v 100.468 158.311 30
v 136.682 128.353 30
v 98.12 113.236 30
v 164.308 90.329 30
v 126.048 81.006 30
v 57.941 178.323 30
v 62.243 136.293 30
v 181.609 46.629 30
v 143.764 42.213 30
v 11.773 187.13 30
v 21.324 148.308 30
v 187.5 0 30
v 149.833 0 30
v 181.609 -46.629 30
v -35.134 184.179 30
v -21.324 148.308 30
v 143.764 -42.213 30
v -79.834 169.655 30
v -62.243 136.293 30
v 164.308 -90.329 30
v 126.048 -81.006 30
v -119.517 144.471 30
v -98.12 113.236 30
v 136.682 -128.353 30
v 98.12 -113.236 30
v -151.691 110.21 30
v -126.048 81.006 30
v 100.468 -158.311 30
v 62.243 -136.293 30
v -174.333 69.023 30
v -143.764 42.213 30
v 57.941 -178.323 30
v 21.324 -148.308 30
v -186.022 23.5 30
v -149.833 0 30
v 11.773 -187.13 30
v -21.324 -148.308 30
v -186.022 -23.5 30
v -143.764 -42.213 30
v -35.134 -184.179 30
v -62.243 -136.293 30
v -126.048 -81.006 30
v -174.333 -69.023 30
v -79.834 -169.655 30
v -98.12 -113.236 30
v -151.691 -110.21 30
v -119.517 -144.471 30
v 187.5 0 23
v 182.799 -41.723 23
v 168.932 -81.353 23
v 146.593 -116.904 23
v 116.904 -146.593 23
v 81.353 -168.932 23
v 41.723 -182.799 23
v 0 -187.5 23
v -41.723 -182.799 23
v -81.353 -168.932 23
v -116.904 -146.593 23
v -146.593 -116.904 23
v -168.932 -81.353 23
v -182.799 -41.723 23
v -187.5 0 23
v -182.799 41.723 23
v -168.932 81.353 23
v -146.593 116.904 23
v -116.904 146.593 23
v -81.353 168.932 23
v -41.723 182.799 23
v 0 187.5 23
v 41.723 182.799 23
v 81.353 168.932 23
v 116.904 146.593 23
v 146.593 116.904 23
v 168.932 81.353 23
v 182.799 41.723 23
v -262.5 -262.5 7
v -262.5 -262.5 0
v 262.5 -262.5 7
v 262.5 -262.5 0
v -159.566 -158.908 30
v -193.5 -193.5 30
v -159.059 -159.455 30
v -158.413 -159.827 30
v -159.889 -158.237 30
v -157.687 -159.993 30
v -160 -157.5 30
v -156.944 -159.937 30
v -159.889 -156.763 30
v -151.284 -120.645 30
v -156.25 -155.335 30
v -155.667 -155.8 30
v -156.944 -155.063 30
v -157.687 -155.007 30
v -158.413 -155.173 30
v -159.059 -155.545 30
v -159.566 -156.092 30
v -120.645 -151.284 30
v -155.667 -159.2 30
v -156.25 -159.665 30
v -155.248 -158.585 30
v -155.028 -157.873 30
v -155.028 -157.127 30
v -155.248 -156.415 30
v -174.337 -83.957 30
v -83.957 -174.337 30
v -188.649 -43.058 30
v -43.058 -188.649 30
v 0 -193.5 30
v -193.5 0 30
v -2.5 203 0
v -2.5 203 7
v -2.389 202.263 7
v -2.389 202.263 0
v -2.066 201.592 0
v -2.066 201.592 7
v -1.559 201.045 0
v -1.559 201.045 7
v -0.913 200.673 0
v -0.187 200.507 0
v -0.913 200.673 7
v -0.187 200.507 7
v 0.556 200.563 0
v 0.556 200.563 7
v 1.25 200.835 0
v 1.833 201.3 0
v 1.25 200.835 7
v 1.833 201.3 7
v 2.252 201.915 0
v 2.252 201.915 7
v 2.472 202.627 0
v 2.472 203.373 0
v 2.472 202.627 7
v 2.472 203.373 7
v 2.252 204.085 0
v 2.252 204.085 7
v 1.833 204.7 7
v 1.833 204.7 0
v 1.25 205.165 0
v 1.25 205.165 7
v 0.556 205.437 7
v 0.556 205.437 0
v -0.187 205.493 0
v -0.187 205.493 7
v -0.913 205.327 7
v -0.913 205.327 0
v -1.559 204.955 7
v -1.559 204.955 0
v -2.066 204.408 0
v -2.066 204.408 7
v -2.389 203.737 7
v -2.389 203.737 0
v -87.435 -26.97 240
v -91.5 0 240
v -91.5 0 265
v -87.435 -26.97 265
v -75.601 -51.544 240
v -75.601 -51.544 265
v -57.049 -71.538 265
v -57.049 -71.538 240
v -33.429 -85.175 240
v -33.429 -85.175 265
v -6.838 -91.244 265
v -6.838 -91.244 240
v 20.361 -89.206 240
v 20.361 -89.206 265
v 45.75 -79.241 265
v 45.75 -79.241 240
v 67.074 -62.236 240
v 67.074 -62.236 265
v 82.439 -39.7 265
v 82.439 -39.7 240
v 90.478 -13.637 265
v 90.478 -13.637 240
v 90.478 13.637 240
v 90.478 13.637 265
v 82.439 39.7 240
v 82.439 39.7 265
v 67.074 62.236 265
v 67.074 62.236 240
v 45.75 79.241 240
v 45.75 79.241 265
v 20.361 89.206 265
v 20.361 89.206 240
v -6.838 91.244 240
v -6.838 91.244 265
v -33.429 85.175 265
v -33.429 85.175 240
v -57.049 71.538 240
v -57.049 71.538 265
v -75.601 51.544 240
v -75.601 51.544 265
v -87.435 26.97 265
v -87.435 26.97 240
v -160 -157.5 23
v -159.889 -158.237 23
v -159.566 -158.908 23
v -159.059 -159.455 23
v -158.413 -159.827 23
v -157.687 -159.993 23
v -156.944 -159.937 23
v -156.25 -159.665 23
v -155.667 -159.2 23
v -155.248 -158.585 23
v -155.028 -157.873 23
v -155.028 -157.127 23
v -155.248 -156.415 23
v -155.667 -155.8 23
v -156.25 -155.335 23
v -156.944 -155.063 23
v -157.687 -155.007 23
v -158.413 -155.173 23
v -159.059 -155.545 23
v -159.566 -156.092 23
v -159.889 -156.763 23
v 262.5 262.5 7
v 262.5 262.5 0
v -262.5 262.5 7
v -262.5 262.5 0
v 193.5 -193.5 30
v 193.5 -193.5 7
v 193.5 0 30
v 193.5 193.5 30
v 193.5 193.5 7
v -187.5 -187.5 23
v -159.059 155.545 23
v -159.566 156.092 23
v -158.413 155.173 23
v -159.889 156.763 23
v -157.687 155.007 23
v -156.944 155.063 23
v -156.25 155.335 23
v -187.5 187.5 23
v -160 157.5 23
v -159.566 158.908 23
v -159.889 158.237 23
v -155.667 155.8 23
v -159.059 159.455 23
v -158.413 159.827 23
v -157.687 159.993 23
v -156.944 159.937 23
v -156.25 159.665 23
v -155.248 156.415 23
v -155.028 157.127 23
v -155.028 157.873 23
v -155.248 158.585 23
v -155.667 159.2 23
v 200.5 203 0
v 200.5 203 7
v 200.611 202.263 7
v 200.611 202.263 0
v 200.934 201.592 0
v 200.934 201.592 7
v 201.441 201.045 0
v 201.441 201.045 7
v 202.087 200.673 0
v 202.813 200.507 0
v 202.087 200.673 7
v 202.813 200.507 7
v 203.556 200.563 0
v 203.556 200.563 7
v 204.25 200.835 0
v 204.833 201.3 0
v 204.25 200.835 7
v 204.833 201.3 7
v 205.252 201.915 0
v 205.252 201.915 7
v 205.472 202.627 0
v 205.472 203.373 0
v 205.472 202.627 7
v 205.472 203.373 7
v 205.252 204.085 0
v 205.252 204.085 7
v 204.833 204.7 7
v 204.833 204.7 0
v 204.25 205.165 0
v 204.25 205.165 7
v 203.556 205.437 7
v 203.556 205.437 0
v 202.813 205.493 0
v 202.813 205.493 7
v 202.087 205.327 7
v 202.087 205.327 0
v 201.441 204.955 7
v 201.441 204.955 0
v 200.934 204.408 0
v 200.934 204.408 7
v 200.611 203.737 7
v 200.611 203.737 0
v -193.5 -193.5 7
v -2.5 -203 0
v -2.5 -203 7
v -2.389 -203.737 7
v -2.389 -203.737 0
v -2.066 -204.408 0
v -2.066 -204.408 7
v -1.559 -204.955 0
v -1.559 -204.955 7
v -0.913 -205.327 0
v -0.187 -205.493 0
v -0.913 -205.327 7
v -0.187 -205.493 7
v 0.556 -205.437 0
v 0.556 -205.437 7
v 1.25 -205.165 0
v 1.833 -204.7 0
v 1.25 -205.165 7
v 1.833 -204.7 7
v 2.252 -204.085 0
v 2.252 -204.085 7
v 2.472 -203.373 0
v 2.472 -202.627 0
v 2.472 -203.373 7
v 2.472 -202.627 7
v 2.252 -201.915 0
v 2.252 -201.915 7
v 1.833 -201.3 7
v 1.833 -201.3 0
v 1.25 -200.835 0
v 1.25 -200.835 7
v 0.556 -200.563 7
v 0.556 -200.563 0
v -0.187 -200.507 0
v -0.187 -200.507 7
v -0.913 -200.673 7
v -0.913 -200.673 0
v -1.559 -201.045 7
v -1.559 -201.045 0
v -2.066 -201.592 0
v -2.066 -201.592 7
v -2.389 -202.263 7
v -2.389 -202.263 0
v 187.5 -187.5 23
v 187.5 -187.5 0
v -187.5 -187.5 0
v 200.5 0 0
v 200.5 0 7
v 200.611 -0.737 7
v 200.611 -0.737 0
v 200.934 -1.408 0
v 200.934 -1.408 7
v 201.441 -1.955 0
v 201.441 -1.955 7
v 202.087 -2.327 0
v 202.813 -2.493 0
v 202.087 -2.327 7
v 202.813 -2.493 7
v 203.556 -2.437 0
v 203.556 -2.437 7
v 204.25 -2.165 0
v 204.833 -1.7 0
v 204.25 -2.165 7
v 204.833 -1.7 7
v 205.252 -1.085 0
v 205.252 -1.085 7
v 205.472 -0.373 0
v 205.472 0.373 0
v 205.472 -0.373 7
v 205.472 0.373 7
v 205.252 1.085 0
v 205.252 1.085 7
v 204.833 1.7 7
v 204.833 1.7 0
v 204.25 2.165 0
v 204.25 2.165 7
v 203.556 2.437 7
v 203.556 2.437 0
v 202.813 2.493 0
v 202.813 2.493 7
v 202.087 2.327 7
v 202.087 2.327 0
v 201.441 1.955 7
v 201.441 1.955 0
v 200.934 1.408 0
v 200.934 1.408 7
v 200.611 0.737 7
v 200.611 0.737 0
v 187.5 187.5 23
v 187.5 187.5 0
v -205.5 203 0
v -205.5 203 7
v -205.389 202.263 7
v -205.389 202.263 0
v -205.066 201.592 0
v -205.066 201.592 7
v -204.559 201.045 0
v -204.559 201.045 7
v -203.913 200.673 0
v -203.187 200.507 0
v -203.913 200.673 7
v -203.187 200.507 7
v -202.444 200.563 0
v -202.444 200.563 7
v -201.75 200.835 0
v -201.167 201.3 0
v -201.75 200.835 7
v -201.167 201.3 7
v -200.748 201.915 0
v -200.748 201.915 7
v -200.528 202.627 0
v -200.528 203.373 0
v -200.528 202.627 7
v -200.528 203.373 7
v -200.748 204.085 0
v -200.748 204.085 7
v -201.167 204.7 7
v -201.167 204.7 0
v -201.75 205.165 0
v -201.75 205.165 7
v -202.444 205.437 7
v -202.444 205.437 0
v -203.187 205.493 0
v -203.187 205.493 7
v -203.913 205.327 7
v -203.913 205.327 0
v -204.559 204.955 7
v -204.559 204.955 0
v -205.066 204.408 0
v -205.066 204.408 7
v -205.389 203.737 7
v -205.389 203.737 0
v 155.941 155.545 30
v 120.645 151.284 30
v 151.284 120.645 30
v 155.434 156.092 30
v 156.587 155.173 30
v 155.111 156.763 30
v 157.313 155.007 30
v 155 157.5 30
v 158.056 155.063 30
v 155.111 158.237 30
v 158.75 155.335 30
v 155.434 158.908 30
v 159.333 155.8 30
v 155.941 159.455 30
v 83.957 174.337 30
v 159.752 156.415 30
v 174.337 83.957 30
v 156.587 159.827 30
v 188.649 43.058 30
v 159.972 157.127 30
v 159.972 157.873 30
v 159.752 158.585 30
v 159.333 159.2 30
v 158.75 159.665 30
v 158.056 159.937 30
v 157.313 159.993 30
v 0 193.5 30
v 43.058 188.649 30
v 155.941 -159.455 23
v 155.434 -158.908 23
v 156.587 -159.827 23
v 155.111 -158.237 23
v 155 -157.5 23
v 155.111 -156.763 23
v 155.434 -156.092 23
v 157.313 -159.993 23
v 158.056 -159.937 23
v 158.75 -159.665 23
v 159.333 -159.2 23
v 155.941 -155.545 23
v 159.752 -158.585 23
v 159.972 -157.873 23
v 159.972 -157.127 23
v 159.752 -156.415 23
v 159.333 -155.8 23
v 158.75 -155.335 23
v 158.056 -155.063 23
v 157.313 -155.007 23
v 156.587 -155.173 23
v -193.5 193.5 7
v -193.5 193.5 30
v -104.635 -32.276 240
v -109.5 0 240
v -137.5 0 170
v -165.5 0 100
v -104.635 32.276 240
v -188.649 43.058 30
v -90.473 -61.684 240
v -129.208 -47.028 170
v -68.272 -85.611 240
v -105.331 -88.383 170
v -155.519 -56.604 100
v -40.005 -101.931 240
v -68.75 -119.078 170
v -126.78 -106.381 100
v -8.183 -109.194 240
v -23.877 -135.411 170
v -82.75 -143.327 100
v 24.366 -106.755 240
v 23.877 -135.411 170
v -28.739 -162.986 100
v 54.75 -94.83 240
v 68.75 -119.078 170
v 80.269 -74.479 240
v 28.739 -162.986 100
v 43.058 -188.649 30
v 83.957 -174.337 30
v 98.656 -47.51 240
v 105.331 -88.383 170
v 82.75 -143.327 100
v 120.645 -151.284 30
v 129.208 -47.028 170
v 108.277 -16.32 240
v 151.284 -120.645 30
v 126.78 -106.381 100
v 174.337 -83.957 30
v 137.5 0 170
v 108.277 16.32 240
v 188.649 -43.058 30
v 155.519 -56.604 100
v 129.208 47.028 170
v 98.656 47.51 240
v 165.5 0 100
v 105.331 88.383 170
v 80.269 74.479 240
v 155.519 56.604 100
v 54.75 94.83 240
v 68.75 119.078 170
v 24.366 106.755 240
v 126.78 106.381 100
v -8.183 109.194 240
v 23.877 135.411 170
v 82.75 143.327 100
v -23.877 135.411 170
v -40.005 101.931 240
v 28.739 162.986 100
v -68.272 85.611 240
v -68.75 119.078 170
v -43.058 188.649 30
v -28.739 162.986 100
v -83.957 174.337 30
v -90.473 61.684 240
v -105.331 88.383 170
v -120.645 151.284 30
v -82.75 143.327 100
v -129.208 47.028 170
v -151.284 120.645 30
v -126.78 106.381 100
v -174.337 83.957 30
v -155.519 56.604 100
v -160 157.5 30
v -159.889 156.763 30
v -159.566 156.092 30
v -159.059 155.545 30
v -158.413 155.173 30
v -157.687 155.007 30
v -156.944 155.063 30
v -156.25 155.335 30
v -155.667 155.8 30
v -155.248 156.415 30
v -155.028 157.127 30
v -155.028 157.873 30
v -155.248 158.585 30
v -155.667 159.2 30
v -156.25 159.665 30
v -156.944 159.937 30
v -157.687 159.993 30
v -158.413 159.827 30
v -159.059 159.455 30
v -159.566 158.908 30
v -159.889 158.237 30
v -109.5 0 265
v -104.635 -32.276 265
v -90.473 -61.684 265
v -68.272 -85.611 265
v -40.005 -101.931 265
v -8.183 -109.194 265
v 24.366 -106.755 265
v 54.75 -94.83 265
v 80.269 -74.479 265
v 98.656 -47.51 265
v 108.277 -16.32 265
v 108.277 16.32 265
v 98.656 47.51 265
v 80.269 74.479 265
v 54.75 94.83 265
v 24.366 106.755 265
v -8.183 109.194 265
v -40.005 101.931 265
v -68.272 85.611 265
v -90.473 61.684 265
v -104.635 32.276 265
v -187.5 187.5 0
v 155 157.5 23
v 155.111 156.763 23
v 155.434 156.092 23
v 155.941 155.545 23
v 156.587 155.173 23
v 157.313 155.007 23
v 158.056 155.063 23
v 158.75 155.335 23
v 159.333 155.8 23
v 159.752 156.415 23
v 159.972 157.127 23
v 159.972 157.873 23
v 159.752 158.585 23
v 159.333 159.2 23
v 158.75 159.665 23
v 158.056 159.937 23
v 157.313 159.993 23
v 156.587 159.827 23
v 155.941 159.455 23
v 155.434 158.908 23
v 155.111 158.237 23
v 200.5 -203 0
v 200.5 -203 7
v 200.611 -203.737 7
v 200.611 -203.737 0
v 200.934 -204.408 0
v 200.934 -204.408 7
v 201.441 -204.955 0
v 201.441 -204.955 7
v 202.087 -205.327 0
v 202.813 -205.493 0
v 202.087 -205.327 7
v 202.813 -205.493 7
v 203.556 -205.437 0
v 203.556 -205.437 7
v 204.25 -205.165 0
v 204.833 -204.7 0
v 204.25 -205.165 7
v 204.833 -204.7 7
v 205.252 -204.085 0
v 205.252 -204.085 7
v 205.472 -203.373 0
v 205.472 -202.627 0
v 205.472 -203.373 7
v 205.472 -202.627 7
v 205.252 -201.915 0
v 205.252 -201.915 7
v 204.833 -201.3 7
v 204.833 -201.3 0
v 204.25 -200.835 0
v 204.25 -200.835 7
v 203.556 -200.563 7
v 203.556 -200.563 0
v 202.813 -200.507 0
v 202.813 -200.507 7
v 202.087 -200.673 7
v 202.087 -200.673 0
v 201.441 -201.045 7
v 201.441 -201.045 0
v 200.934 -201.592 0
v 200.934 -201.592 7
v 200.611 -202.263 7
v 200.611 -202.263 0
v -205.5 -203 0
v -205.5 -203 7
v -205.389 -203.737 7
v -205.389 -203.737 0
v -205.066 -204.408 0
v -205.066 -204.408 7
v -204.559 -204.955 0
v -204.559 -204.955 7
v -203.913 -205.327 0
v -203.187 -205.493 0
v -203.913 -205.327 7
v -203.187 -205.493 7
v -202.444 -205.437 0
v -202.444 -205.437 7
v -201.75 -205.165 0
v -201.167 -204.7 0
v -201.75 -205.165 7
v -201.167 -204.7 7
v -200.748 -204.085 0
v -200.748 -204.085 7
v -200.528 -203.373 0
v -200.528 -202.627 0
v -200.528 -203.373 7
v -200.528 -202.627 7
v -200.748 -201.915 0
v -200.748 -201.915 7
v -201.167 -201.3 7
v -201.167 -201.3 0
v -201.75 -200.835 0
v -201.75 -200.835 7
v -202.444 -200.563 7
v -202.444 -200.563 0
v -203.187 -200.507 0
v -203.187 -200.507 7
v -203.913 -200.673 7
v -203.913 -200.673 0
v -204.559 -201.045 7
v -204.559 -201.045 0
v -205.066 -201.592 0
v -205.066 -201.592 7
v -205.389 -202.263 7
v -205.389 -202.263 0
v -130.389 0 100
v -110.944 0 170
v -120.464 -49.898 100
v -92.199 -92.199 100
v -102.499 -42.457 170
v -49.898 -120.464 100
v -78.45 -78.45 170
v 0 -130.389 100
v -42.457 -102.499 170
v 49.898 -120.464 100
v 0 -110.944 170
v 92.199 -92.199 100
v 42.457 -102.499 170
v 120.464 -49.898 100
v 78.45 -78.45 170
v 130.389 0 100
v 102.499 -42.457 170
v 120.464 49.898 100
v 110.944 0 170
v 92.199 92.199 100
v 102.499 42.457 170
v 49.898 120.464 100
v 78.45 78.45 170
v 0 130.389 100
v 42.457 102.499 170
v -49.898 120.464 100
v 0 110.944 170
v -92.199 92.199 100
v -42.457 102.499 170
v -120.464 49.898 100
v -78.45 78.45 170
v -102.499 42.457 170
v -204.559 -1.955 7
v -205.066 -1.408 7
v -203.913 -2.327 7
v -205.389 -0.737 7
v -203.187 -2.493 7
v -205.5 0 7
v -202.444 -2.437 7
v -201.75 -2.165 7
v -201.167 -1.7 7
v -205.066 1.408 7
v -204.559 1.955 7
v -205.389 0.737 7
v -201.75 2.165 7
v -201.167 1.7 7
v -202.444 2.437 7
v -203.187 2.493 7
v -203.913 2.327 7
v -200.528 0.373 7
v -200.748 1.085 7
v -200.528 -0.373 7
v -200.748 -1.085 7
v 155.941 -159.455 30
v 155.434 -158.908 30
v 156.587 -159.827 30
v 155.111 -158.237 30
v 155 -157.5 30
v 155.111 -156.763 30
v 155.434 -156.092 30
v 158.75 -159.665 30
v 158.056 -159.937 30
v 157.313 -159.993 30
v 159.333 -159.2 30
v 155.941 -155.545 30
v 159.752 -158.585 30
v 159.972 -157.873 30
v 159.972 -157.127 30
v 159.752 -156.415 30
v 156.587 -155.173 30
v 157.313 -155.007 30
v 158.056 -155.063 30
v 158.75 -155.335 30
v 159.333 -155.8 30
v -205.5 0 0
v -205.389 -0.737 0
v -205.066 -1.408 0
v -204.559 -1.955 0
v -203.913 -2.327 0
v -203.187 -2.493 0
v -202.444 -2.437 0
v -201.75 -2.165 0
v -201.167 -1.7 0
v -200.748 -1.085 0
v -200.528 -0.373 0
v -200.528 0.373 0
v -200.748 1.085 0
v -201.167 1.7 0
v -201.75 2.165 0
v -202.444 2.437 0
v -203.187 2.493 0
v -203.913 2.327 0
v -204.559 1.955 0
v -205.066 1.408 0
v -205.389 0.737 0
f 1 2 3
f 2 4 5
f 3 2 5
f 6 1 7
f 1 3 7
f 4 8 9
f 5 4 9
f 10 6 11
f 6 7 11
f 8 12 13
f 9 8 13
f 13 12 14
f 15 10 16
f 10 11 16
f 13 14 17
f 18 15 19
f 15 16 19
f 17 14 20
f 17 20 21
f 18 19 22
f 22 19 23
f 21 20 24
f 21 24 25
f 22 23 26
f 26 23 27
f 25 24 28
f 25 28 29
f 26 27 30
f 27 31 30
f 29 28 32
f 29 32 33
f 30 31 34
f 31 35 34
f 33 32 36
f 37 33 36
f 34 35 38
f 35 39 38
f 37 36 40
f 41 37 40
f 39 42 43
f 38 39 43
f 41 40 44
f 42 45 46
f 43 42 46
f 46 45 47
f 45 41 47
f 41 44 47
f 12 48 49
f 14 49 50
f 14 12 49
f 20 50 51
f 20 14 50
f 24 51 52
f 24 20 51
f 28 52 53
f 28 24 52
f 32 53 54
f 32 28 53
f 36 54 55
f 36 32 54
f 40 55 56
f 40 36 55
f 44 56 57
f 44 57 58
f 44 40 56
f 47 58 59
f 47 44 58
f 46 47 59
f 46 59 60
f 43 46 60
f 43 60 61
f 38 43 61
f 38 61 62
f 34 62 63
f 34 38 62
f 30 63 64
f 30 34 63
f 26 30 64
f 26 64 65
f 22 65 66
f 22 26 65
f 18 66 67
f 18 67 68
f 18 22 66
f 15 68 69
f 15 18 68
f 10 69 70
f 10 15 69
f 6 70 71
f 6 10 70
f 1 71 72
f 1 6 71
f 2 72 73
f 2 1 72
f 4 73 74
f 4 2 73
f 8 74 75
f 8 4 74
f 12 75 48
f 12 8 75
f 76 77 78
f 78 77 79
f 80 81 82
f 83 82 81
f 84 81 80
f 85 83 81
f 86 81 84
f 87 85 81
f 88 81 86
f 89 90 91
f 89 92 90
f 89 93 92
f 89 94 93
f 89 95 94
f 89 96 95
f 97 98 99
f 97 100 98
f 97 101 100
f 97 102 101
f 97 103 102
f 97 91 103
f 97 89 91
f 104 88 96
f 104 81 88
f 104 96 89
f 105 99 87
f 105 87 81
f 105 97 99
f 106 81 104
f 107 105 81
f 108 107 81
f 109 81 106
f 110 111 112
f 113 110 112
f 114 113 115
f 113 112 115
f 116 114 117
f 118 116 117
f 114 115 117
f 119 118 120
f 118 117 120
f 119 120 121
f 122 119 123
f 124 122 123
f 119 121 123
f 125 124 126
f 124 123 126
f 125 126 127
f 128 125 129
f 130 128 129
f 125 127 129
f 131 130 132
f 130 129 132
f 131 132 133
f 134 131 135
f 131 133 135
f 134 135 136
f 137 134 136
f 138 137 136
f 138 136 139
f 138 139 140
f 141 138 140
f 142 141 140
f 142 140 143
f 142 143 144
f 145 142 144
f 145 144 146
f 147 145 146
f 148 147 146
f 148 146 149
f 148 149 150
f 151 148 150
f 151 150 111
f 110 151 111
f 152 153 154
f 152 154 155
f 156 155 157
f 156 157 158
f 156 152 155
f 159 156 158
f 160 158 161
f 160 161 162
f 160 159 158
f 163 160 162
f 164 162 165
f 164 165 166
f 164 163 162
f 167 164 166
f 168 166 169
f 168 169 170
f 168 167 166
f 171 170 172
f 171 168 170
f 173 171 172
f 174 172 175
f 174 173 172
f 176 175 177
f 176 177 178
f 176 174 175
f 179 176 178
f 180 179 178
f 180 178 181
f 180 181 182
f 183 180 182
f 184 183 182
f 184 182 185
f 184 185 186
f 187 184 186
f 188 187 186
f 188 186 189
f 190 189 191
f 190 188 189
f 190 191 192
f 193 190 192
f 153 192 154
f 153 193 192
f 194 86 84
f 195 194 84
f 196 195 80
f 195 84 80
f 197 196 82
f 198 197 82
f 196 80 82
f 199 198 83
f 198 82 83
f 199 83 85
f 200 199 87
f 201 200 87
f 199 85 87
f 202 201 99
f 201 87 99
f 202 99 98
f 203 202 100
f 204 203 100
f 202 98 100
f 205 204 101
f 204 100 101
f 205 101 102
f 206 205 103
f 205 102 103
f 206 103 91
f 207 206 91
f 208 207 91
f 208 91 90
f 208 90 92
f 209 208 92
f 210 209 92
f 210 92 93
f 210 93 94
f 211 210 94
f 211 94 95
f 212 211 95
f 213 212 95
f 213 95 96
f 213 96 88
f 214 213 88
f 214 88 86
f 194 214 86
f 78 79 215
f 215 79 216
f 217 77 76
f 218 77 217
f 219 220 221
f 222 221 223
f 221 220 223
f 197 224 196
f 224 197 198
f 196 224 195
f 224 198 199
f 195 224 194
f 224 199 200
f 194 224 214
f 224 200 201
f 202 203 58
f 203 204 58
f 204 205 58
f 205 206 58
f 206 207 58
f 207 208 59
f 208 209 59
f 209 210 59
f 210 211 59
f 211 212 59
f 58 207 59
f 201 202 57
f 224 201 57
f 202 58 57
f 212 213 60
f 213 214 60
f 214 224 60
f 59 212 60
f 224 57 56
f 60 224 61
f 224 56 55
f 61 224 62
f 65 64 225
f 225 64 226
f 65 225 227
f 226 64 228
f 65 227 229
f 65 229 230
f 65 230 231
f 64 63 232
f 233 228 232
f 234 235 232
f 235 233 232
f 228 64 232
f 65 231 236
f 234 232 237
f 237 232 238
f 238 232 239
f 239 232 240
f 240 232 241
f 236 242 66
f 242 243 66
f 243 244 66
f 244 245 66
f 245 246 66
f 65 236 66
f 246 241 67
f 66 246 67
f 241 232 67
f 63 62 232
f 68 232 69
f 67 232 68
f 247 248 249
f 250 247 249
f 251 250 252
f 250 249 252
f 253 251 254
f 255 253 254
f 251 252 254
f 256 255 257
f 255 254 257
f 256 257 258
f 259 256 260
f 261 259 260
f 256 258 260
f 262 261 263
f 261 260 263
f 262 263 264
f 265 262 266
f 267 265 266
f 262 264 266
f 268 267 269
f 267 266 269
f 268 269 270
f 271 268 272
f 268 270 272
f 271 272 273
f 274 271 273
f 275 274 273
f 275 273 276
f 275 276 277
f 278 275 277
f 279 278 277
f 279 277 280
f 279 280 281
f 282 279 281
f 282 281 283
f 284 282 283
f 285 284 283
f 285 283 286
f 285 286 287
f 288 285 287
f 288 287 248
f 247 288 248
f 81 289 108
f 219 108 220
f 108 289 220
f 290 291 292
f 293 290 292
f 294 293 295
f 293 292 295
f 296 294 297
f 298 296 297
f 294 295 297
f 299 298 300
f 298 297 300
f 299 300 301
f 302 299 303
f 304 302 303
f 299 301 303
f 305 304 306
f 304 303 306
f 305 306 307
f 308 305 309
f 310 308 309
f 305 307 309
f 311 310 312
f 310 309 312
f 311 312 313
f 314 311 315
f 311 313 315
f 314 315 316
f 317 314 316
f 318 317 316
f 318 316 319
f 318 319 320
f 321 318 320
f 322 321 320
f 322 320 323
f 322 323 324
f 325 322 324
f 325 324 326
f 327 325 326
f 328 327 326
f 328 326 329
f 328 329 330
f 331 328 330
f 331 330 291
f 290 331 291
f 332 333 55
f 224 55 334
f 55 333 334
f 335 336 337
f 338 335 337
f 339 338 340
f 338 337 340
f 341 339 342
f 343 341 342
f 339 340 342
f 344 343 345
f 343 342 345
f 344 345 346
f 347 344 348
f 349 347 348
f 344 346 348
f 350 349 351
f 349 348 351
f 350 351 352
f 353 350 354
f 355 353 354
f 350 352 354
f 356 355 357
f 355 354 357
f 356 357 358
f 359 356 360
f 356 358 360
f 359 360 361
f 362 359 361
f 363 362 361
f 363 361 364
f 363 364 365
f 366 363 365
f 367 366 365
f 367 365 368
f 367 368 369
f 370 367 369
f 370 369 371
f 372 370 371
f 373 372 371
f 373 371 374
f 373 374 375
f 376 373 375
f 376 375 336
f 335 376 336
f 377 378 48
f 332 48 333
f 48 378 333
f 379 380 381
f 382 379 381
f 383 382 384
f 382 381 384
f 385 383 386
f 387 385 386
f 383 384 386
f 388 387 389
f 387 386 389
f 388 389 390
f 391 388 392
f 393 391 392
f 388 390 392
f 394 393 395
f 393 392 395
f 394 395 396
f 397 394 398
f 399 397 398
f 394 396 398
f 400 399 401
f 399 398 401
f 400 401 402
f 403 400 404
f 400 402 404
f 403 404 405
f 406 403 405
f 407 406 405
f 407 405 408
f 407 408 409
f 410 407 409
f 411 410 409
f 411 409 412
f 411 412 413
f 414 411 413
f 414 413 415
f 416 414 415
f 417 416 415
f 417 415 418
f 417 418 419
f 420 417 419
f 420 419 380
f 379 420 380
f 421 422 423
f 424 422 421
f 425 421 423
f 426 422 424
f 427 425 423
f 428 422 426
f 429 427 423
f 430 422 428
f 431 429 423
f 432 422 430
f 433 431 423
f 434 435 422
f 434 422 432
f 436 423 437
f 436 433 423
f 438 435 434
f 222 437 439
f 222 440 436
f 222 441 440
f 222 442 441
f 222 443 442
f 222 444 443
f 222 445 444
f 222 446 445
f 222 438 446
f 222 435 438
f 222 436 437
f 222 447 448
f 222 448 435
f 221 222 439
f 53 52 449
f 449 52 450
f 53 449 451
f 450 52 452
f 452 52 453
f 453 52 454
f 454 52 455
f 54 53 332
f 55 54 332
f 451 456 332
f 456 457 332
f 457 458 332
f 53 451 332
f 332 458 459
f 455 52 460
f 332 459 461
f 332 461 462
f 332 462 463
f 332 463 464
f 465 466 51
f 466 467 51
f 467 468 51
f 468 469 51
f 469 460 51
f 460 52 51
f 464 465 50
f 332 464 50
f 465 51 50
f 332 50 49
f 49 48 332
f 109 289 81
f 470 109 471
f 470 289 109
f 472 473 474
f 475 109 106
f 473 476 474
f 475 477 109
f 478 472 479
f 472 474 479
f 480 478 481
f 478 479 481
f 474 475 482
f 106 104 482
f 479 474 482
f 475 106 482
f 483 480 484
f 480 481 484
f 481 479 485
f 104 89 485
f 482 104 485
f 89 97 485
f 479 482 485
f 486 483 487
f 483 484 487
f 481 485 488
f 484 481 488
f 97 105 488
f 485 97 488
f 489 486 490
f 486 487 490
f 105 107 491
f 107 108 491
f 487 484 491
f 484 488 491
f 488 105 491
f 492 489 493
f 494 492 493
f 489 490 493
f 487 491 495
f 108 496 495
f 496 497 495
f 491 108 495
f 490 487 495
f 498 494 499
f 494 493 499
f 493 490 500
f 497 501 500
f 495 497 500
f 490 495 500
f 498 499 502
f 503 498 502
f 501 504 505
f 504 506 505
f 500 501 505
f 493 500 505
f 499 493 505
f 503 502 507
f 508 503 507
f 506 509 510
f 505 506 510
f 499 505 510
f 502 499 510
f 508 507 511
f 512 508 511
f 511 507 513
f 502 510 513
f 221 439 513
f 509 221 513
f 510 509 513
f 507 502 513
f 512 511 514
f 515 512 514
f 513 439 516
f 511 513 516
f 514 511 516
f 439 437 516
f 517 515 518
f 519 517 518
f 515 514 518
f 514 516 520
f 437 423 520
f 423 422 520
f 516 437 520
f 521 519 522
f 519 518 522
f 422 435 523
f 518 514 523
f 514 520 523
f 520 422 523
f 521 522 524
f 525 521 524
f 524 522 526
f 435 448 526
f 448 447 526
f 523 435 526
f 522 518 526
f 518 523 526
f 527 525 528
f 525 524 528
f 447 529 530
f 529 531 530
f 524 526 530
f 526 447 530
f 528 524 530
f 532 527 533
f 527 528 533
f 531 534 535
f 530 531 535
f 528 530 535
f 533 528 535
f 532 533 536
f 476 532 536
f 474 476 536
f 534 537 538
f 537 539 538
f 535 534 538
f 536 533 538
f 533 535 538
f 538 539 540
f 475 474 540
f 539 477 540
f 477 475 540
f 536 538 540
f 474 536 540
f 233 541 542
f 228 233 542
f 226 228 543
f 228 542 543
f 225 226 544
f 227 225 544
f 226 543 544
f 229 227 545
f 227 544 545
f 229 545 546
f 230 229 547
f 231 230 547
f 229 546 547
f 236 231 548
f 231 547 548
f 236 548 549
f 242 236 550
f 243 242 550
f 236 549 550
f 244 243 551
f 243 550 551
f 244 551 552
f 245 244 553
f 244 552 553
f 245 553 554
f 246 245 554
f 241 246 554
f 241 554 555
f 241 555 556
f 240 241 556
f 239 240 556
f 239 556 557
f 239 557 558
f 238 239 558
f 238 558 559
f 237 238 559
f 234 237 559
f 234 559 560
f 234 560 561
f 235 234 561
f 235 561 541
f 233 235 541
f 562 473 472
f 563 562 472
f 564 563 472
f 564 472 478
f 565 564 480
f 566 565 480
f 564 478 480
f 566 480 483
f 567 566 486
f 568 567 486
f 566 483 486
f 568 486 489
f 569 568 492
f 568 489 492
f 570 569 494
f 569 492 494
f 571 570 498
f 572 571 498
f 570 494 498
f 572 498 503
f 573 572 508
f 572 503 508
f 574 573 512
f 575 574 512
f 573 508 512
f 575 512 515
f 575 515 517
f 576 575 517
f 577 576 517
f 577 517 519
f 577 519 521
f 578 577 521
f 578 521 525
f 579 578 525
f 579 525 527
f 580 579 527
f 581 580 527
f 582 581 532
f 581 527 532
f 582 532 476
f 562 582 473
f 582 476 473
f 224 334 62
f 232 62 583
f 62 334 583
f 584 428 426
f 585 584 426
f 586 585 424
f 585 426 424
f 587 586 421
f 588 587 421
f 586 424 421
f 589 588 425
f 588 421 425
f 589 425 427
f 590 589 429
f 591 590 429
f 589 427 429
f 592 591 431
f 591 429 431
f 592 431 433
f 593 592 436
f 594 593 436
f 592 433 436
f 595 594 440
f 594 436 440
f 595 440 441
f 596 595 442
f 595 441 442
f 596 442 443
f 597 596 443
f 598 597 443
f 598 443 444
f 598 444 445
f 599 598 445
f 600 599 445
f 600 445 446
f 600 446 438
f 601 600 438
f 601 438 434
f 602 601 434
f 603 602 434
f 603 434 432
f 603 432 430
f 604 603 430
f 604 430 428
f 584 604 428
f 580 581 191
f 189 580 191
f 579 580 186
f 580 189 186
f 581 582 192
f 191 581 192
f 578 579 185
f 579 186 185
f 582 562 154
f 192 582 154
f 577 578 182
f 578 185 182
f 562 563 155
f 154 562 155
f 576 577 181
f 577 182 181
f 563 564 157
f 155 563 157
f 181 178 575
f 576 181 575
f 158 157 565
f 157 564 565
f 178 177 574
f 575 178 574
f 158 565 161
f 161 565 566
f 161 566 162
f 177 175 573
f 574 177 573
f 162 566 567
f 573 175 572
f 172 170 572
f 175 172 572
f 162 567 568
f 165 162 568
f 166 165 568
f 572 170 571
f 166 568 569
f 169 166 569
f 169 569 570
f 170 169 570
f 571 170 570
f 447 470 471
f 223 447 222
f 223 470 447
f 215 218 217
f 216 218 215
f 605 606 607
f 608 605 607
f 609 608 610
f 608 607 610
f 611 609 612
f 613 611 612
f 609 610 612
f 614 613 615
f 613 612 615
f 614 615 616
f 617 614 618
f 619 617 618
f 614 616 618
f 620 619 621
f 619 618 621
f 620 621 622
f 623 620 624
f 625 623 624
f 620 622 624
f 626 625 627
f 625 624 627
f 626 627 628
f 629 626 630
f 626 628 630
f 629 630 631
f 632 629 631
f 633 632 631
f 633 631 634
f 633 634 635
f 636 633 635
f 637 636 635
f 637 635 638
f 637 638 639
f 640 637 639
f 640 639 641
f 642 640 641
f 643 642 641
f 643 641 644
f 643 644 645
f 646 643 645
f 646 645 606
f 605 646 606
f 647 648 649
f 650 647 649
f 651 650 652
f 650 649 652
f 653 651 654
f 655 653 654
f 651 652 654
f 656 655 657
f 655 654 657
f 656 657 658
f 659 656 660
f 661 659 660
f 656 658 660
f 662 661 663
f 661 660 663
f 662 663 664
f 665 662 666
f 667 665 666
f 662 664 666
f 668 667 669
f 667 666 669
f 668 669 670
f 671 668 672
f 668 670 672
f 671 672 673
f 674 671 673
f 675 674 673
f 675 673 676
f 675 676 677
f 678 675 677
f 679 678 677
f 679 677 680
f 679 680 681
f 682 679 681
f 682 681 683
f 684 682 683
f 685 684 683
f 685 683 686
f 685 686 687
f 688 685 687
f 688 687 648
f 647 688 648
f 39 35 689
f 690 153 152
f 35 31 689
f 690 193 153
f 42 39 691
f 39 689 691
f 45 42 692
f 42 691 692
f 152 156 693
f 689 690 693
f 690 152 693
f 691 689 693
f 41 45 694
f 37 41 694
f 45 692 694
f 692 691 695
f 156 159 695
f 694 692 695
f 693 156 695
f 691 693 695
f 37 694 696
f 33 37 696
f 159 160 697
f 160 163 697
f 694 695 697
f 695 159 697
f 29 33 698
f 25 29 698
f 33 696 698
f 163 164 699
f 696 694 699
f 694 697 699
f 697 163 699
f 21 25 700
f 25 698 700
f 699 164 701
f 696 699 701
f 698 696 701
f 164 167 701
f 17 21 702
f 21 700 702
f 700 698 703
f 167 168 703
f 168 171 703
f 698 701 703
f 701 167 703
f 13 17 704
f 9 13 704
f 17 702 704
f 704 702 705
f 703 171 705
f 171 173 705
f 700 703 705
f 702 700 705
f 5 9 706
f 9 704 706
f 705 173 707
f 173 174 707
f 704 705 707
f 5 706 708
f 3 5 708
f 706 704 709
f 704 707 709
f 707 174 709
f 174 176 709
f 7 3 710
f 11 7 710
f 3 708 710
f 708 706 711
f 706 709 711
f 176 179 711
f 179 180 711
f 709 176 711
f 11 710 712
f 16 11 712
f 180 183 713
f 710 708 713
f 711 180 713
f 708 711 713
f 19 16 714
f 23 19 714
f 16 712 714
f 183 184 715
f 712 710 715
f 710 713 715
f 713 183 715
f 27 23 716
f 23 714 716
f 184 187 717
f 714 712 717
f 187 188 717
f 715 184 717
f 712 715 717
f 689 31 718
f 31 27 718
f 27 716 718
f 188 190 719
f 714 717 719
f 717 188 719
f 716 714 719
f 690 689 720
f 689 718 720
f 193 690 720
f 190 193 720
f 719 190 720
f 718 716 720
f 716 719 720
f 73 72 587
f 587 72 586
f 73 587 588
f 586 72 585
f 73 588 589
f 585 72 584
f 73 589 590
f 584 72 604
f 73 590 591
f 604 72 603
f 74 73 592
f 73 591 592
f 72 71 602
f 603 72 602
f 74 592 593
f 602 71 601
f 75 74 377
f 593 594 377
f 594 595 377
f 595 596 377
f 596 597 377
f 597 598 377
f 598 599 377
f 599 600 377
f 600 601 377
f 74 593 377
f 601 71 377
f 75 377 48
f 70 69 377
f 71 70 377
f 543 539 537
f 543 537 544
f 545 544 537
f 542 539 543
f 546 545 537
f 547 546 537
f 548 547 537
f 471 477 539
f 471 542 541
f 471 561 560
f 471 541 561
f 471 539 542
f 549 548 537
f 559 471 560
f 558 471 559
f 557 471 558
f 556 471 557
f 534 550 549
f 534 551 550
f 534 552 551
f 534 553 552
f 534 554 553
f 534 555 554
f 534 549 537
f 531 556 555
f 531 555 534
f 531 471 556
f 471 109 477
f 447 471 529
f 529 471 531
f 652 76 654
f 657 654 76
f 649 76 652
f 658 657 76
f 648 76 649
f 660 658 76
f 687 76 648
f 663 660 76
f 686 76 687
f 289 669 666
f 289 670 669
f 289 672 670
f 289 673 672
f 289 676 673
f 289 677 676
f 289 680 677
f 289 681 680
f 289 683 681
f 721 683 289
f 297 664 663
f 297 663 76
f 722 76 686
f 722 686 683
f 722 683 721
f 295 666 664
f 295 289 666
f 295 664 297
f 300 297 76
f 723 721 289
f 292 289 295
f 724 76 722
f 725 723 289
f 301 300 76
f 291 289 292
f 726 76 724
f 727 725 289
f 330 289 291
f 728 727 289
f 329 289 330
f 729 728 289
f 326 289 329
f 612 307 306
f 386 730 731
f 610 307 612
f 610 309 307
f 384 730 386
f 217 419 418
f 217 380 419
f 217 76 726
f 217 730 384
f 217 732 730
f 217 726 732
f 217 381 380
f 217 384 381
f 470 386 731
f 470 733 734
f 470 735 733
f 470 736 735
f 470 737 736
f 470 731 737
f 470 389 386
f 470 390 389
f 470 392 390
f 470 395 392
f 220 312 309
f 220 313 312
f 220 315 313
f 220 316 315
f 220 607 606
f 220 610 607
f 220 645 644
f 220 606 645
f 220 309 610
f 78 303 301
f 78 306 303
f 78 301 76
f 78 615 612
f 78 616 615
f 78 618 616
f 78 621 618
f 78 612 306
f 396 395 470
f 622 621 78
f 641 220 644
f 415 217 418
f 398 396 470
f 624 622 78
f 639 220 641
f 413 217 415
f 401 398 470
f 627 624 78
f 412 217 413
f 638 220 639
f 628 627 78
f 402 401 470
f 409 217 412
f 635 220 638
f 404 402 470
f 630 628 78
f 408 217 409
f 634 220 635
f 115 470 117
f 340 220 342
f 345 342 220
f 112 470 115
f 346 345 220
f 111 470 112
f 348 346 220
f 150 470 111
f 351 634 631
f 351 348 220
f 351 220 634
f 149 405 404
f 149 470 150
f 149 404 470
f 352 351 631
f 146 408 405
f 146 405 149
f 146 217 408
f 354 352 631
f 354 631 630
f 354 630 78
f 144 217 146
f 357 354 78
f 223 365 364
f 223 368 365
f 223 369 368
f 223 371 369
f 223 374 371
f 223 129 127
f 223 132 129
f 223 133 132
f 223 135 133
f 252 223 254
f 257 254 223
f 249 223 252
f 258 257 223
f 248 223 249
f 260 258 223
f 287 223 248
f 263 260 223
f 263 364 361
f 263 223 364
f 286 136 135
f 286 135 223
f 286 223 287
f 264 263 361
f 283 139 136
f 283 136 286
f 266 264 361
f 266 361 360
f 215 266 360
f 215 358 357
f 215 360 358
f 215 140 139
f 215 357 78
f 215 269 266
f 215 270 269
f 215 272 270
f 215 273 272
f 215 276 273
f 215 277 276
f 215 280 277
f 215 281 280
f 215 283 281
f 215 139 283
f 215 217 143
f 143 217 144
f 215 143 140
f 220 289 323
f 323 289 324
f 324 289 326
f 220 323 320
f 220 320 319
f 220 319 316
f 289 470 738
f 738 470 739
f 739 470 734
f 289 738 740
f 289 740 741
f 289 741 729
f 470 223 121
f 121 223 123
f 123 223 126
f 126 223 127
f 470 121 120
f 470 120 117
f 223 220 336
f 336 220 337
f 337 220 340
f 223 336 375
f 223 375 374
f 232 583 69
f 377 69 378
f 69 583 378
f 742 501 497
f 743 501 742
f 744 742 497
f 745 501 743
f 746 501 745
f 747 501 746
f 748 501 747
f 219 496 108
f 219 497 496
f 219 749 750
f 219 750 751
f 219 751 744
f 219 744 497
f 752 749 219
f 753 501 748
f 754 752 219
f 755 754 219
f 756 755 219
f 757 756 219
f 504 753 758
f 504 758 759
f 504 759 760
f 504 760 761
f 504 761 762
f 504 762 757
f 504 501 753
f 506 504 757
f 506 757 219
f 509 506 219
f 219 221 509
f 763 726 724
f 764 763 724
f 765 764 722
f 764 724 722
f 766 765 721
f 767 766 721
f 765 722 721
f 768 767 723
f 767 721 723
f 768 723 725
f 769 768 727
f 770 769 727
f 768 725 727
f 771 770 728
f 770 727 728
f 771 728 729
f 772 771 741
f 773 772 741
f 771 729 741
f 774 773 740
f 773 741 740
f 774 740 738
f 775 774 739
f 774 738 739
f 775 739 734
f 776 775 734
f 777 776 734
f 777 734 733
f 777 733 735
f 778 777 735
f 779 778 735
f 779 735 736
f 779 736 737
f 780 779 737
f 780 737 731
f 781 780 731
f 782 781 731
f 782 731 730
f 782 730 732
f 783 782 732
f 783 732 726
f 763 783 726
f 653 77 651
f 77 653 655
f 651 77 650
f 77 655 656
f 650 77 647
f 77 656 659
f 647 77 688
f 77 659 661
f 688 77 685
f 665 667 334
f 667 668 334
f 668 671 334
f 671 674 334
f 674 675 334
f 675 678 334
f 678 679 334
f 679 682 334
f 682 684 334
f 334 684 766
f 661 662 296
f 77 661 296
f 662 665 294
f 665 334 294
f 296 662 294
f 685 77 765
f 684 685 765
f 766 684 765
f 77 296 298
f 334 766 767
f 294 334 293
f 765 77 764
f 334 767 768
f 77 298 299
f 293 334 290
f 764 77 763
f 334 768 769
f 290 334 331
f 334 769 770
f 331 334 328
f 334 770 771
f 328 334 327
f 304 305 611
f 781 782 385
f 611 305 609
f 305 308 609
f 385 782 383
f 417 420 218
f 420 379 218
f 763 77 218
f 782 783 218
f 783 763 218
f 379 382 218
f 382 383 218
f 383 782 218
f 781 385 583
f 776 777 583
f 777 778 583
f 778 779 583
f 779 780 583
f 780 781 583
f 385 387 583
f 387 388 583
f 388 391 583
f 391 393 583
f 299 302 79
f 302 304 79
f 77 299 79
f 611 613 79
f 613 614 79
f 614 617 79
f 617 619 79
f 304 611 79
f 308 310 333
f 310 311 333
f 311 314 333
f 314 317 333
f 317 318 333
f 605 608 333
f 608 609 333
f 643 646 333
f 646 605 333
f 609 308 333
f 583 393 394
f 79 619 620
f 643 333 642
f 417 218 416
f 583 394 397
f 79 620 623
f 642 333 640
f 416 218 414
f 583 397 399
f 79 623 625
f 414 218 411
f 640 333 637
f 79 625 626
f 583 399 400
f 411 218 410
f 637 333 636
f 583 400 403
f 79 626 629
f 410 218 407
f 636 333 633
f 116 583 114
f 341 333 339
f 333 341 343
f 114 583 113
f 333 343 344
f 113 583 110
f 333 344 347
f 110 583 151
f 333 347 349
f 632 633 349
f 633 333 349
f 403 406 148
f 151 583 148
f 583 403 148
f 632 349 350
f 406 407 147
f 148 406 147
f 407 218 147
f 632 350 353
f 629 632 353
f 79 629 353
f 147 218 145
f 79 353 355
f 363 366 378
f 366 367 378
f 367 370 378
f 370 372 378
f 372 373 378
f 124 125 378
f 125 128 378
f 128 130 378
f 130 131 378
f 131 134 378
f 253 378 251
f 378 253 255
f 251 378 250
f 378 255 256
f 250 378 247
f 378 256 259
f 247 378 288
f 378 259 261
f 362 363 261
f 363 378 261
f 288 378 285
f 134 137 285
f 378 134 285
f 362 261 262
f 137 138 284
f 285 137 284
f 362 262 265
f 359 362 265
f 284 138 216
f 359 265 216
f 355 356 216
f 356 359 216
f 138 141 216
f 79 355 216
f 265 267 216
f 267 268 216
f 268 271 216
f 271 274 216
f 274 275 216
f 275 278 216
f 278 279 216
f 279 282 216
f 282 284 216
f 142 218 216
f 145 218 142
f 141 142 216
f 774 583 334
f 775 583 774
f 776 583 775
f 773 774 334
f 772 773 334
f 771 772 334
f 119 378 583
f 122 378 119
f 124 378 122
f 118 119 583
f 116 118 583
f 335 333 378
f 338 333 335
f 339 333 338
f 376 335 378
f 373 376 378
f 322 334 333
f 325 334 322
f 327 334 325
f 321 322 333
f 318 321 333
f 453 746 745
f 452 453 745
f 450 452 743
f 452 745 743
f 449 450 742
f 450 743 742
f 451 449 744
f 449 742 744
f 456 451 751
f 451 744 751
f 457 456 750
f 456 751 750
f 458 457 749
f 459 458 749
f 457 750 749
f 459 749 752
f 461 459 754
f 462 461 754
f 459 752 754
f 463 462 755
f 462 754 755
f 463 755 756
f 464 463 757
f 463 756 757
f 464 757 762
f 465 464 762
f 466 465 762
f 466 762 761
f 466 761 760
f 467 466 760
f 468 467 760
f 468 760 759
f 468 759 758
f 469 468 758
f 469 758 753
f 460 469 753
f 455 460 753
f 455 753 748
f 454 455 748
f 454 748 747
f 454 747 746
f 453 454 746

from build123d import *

# Parameters (mm, degrees)
F0_W      = 525
F0_H      = 525
F0_W_2    = 387
F0_H_2    = 387
F1_DEPTH  = 7
F2_DEPTH  = 30
F4_DEPTH  = 7
F7_DEPTH  = 25
F8_D      = 5
F9_D      = 5
F10_D     = 5
F11_D     = 5
F12_D     = 5
F13_R     = 2.5
F13_R_2   = 7.5
F14_DEPTH = 10


# Not quite as in the source:
# - a feature names something its author has since deleted; it is built from what else it names


with BuildPart() as f1:
    # F0 (on Top) → F1 (new body)
    with BuildSketch(Plane.XY):
        Rectangle(F0_W, F0_H)
        Rectangle(F0_W_2, F0_H_2, mode=Mode.SUBTRACT)
    extrude(amount=F1_DEPTH)

    # F0 (on Top) → F2 (join)
    with BuildSketch(Plane.XY):
        Rectangle(F0_W_2, F0_H_2)
        Polygon((-187.5, -6.596e-07), (-187.5, 187.5), (-6.149e-07, 187.5), (187.5, 187.5), (187.5, 0), (187.5, -187.5), (-6.893e-07, -187.5), (-187.5, -187.5), align=None, mode=Mode.SUBTRACT)
    extrude(amount=F2_DEPTH)

    # F3 (on face) → F4 (join)
    with BuildSketch(Plane.XY.offset(30)):
        with BuildLine():
            ThreePointArc((-187.5, 47.8121323515), (-136.8251621596, 136.8251621596), (-47.8121323515, 187.5))
            Line((-47.8121323515, 187.5), (-187.5, 187.5))
            Line((-187.5, 187.5), (-187.5, 47.8121323515))
        make_face()
        with BuildLine():
            ThreePointArc((-6.149e-07, 187.5), (132.5825212551, 132.5825216899), (187.5, 0))
            Line((187.5, 0), (187.5, 47.8121323515))
            ThreePointArc((187.5, 47.8121323515), (136.8251621596, 136.8251621596), (47.8121323515, 187.5))
            Line((47.8121323515, 187.5), (-6.149e-07, 187.5))
        make_face()
        with BuildLine():
            ThreePointArc((-187.5, -6.596e-07), (-132.5825219231, 132.5825210219), (-6.149e-07, 187.5))
            Line((-6.149e-07, 187.5), (-47.8121323515, 187.5))
            ThreePointArc((-47.8121323515, 187.5), (-136.8251621596, 136.8251621596), (-187.5, 47.8121323515))
            Line((-187.5, 47.8121323515), (-187.5, -6.596e-07))
        make_face()
        with BuildLine():
            Line((-47.8121323515, -187.5), (-6.893e-07, -187.5))
            ThreePointArc((-6.893e-07, -187.5), (-132.582521483, -132.582521462), (-187.5, -6.596e-07))
            Line((-187.5, -6.596e-07), (-187.5, -47.8121323515))
            ThreePointArc((-187.5, -47.8121323515), (-136.8251621596, -136.8251621596), (-47.8121323515, -187.5))
        make_face()
        with BuildLine():
            Line((187.5, -47.8121323515), (187.5, 0))
            ThreePointArc((187.5, 0), (132.5825212288, -132.5825217162), (-6.893e-07, -187.5))
            Line((-6.893e-07, -187.5), (47.8121323515, -187.5))
            ThreePointArc((47.8121323515, -187.5), (136.8251621596, -136.8251621596), (187.5, -47.8121323515))
        make_face()
        with BuildLine():
            ThreePointArc((47.8121323515, 187.5), (136.8251621596, 136.8251621596), (187.5, 47.8121323515))
            Line((187.5, 47.8121323515), (187.5, 187.5))
            Line((187.5, 187.5), (47.8121323515, 187.5))
        make_face()
        with BuildLine():
            Line((187.5, -187.5), (187.5, -47.8121323515))
            ThreePointArc((187.5, -47.8121323515), (136.8251621596, -136.8251621596), (47.8121323515, -187.5))
            Line((47.8121323515, -187.5), (187.5, -187.5))
        make_face()
        with BuildLine():
            Line((-187.5, -187.5), (-47.8121323515, -187.5))
            ThreePointArc((-47.8121323515, -187.5), (-136.8251621596, -136.8251621596), (-187.5, -47.8121323515))
            Line((-187.5, -47.8121323515), (-187.5, -187.5))
        make_face()
    extrude(amount=-F4_DEPTH)

    # F5 (on Front) → F6 (revolve)
    with BuildSketch(Plane.XZ):
        Polygon((-109.5, 240), (-193.5, 30), (-149.8333333333, 30), (-91.5, 240), align=None)
    revolve(axis=Axis((0, 0, 120), (0, 0, 1)))

    # F7 (add): a face of the model
    f7_faces = [f1.faces().sort_by_distance(p)[0] for p in [
        (94.5971277016, 0, 240),
    ]]
    extrude(f7_faces, amount=F7_DEPTH)

    # F8 (through all)
    with Locations(Plane(origin=(0, 0, 0), x_dir=(1, 0, 0), z_dir=(0, 0, -1))):
        with Locations((-157.5, -157.5)):
            Hole(F8_D / 2)

    # F9 (through all)
    with Locations(Plane(origin=(0, 0, 0), x_dir=(1, 0, 0), z_dir=(0, 0, -1))):
        with Locations((157.5, -157.5)):
            Hole(F9_D / 2)

    # F10 (through all)
    with Locations(Plane(origin=(0, 0, 0), x_dir=(1, 0, 0), z_dir=(0, 0, -1))):
        with Locations((-157.5, 157.5)):
            Hole(F10_D / 2)

    # F11 (through all)
    with Locations(Plane(origin=(0, 0, 0), x_dir=(1, 0, 0), z_dir=(0, 0, -1))):
        with Locations((157.5, 157.5)):
            Hole(F11_D / 2)

    # F12 (through all)
    with Locations(Plane(origin=(0, 0, 0), x_dir=(1, 0, 0), z_dir=(0, 0, -1))):
        with Locations((-203, -203), (0, -203), (203, -203), (203, 0), (203, 203), (0, 203), (-203, 203), (-203, 0)):
            Hole(F12_D / 2)

    # F13 (on face) → F14 (cut)
    with BuildSketch(Plane.XY.offset(30)):
        with Locations((157.5, -157.5)):
            Circle(F13_R)
        with Locations((-157.5, -157.5)):
            Circle(F13_R_2)
        with Locations((-157.5, 157.5)):
            Circle(F13_R_2)
        with Locations((157.5, 157.5)):
            Circle(F13_R_2)
    extrude(amount=F14_DEPTH, mode=Mode.SUBTRACT)


solid = f1.part
